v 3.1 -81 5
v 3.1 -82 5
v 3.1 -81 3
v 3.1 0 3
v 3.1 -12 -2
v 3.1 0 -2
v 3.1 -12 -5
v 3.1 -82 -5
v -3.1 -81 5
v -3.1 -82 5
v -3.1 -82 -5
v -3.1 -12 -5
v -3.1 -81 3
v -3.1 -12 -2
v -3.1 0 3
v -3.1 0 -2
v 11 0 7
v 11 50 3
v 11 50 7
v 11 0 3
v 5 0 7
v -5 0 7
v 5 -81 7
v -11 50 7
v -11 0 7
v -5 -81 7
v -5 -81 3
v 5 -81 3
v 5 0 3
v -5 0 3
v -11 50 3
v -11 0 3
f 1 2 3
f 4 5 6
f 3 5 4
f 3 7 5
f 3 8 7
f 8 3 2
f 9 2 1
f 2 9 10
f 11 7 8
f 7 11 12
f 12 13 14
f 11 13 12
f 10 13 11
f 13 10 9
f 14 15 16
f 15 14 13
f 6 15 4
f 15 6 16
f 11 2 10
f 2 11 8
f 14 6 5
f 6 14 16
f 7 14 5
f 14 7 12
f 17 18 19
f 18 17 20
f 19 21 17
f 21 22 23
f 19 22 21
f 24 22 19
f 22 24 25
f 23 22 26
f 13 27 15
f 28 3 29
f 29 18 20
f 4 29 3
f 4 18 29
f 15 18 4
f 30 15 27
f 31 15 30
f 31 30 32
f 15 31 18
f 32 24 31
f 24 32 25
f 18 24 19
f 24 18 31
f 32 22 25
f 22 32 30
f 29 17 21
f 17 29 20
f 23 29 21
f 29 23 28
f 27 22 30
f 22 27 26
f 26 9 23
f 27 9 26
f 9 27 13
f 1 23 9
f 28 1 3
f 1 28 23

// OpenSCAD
wOnlyLen = 50;
bLen = 82;
insetZ = 10;
insetX = 6.2;
//bX = ;
wX = 22;
//difference(){
//translate([0,-41,0]) union(){
difference(){
    translate([0,-bLen/2,0]) cube([insetX,bLen,insetZ],center=true);
    translate([-6,-12,-14]) cube([12,50,12]);
}
    translate([0,25-bLen/2+bLen/2,5]) cube([wX,bLen+wOnlyLen-bLen,4],center=true);
    translate([0,25-bLen/2-0,5]) cube([10,bLen+wOnlyLen-82+80,4],center=true);
//    translate([0,25-41,5]) cube([22,82+50,2],center=true);
//}
//union(){
//    rotate([15,0,0]) translate([-6,0,0]) cube([12,50,12]);
//    translate([-6,-12,-18]) cube([12,50,12]);
//}
//}
//46-50 mm long
